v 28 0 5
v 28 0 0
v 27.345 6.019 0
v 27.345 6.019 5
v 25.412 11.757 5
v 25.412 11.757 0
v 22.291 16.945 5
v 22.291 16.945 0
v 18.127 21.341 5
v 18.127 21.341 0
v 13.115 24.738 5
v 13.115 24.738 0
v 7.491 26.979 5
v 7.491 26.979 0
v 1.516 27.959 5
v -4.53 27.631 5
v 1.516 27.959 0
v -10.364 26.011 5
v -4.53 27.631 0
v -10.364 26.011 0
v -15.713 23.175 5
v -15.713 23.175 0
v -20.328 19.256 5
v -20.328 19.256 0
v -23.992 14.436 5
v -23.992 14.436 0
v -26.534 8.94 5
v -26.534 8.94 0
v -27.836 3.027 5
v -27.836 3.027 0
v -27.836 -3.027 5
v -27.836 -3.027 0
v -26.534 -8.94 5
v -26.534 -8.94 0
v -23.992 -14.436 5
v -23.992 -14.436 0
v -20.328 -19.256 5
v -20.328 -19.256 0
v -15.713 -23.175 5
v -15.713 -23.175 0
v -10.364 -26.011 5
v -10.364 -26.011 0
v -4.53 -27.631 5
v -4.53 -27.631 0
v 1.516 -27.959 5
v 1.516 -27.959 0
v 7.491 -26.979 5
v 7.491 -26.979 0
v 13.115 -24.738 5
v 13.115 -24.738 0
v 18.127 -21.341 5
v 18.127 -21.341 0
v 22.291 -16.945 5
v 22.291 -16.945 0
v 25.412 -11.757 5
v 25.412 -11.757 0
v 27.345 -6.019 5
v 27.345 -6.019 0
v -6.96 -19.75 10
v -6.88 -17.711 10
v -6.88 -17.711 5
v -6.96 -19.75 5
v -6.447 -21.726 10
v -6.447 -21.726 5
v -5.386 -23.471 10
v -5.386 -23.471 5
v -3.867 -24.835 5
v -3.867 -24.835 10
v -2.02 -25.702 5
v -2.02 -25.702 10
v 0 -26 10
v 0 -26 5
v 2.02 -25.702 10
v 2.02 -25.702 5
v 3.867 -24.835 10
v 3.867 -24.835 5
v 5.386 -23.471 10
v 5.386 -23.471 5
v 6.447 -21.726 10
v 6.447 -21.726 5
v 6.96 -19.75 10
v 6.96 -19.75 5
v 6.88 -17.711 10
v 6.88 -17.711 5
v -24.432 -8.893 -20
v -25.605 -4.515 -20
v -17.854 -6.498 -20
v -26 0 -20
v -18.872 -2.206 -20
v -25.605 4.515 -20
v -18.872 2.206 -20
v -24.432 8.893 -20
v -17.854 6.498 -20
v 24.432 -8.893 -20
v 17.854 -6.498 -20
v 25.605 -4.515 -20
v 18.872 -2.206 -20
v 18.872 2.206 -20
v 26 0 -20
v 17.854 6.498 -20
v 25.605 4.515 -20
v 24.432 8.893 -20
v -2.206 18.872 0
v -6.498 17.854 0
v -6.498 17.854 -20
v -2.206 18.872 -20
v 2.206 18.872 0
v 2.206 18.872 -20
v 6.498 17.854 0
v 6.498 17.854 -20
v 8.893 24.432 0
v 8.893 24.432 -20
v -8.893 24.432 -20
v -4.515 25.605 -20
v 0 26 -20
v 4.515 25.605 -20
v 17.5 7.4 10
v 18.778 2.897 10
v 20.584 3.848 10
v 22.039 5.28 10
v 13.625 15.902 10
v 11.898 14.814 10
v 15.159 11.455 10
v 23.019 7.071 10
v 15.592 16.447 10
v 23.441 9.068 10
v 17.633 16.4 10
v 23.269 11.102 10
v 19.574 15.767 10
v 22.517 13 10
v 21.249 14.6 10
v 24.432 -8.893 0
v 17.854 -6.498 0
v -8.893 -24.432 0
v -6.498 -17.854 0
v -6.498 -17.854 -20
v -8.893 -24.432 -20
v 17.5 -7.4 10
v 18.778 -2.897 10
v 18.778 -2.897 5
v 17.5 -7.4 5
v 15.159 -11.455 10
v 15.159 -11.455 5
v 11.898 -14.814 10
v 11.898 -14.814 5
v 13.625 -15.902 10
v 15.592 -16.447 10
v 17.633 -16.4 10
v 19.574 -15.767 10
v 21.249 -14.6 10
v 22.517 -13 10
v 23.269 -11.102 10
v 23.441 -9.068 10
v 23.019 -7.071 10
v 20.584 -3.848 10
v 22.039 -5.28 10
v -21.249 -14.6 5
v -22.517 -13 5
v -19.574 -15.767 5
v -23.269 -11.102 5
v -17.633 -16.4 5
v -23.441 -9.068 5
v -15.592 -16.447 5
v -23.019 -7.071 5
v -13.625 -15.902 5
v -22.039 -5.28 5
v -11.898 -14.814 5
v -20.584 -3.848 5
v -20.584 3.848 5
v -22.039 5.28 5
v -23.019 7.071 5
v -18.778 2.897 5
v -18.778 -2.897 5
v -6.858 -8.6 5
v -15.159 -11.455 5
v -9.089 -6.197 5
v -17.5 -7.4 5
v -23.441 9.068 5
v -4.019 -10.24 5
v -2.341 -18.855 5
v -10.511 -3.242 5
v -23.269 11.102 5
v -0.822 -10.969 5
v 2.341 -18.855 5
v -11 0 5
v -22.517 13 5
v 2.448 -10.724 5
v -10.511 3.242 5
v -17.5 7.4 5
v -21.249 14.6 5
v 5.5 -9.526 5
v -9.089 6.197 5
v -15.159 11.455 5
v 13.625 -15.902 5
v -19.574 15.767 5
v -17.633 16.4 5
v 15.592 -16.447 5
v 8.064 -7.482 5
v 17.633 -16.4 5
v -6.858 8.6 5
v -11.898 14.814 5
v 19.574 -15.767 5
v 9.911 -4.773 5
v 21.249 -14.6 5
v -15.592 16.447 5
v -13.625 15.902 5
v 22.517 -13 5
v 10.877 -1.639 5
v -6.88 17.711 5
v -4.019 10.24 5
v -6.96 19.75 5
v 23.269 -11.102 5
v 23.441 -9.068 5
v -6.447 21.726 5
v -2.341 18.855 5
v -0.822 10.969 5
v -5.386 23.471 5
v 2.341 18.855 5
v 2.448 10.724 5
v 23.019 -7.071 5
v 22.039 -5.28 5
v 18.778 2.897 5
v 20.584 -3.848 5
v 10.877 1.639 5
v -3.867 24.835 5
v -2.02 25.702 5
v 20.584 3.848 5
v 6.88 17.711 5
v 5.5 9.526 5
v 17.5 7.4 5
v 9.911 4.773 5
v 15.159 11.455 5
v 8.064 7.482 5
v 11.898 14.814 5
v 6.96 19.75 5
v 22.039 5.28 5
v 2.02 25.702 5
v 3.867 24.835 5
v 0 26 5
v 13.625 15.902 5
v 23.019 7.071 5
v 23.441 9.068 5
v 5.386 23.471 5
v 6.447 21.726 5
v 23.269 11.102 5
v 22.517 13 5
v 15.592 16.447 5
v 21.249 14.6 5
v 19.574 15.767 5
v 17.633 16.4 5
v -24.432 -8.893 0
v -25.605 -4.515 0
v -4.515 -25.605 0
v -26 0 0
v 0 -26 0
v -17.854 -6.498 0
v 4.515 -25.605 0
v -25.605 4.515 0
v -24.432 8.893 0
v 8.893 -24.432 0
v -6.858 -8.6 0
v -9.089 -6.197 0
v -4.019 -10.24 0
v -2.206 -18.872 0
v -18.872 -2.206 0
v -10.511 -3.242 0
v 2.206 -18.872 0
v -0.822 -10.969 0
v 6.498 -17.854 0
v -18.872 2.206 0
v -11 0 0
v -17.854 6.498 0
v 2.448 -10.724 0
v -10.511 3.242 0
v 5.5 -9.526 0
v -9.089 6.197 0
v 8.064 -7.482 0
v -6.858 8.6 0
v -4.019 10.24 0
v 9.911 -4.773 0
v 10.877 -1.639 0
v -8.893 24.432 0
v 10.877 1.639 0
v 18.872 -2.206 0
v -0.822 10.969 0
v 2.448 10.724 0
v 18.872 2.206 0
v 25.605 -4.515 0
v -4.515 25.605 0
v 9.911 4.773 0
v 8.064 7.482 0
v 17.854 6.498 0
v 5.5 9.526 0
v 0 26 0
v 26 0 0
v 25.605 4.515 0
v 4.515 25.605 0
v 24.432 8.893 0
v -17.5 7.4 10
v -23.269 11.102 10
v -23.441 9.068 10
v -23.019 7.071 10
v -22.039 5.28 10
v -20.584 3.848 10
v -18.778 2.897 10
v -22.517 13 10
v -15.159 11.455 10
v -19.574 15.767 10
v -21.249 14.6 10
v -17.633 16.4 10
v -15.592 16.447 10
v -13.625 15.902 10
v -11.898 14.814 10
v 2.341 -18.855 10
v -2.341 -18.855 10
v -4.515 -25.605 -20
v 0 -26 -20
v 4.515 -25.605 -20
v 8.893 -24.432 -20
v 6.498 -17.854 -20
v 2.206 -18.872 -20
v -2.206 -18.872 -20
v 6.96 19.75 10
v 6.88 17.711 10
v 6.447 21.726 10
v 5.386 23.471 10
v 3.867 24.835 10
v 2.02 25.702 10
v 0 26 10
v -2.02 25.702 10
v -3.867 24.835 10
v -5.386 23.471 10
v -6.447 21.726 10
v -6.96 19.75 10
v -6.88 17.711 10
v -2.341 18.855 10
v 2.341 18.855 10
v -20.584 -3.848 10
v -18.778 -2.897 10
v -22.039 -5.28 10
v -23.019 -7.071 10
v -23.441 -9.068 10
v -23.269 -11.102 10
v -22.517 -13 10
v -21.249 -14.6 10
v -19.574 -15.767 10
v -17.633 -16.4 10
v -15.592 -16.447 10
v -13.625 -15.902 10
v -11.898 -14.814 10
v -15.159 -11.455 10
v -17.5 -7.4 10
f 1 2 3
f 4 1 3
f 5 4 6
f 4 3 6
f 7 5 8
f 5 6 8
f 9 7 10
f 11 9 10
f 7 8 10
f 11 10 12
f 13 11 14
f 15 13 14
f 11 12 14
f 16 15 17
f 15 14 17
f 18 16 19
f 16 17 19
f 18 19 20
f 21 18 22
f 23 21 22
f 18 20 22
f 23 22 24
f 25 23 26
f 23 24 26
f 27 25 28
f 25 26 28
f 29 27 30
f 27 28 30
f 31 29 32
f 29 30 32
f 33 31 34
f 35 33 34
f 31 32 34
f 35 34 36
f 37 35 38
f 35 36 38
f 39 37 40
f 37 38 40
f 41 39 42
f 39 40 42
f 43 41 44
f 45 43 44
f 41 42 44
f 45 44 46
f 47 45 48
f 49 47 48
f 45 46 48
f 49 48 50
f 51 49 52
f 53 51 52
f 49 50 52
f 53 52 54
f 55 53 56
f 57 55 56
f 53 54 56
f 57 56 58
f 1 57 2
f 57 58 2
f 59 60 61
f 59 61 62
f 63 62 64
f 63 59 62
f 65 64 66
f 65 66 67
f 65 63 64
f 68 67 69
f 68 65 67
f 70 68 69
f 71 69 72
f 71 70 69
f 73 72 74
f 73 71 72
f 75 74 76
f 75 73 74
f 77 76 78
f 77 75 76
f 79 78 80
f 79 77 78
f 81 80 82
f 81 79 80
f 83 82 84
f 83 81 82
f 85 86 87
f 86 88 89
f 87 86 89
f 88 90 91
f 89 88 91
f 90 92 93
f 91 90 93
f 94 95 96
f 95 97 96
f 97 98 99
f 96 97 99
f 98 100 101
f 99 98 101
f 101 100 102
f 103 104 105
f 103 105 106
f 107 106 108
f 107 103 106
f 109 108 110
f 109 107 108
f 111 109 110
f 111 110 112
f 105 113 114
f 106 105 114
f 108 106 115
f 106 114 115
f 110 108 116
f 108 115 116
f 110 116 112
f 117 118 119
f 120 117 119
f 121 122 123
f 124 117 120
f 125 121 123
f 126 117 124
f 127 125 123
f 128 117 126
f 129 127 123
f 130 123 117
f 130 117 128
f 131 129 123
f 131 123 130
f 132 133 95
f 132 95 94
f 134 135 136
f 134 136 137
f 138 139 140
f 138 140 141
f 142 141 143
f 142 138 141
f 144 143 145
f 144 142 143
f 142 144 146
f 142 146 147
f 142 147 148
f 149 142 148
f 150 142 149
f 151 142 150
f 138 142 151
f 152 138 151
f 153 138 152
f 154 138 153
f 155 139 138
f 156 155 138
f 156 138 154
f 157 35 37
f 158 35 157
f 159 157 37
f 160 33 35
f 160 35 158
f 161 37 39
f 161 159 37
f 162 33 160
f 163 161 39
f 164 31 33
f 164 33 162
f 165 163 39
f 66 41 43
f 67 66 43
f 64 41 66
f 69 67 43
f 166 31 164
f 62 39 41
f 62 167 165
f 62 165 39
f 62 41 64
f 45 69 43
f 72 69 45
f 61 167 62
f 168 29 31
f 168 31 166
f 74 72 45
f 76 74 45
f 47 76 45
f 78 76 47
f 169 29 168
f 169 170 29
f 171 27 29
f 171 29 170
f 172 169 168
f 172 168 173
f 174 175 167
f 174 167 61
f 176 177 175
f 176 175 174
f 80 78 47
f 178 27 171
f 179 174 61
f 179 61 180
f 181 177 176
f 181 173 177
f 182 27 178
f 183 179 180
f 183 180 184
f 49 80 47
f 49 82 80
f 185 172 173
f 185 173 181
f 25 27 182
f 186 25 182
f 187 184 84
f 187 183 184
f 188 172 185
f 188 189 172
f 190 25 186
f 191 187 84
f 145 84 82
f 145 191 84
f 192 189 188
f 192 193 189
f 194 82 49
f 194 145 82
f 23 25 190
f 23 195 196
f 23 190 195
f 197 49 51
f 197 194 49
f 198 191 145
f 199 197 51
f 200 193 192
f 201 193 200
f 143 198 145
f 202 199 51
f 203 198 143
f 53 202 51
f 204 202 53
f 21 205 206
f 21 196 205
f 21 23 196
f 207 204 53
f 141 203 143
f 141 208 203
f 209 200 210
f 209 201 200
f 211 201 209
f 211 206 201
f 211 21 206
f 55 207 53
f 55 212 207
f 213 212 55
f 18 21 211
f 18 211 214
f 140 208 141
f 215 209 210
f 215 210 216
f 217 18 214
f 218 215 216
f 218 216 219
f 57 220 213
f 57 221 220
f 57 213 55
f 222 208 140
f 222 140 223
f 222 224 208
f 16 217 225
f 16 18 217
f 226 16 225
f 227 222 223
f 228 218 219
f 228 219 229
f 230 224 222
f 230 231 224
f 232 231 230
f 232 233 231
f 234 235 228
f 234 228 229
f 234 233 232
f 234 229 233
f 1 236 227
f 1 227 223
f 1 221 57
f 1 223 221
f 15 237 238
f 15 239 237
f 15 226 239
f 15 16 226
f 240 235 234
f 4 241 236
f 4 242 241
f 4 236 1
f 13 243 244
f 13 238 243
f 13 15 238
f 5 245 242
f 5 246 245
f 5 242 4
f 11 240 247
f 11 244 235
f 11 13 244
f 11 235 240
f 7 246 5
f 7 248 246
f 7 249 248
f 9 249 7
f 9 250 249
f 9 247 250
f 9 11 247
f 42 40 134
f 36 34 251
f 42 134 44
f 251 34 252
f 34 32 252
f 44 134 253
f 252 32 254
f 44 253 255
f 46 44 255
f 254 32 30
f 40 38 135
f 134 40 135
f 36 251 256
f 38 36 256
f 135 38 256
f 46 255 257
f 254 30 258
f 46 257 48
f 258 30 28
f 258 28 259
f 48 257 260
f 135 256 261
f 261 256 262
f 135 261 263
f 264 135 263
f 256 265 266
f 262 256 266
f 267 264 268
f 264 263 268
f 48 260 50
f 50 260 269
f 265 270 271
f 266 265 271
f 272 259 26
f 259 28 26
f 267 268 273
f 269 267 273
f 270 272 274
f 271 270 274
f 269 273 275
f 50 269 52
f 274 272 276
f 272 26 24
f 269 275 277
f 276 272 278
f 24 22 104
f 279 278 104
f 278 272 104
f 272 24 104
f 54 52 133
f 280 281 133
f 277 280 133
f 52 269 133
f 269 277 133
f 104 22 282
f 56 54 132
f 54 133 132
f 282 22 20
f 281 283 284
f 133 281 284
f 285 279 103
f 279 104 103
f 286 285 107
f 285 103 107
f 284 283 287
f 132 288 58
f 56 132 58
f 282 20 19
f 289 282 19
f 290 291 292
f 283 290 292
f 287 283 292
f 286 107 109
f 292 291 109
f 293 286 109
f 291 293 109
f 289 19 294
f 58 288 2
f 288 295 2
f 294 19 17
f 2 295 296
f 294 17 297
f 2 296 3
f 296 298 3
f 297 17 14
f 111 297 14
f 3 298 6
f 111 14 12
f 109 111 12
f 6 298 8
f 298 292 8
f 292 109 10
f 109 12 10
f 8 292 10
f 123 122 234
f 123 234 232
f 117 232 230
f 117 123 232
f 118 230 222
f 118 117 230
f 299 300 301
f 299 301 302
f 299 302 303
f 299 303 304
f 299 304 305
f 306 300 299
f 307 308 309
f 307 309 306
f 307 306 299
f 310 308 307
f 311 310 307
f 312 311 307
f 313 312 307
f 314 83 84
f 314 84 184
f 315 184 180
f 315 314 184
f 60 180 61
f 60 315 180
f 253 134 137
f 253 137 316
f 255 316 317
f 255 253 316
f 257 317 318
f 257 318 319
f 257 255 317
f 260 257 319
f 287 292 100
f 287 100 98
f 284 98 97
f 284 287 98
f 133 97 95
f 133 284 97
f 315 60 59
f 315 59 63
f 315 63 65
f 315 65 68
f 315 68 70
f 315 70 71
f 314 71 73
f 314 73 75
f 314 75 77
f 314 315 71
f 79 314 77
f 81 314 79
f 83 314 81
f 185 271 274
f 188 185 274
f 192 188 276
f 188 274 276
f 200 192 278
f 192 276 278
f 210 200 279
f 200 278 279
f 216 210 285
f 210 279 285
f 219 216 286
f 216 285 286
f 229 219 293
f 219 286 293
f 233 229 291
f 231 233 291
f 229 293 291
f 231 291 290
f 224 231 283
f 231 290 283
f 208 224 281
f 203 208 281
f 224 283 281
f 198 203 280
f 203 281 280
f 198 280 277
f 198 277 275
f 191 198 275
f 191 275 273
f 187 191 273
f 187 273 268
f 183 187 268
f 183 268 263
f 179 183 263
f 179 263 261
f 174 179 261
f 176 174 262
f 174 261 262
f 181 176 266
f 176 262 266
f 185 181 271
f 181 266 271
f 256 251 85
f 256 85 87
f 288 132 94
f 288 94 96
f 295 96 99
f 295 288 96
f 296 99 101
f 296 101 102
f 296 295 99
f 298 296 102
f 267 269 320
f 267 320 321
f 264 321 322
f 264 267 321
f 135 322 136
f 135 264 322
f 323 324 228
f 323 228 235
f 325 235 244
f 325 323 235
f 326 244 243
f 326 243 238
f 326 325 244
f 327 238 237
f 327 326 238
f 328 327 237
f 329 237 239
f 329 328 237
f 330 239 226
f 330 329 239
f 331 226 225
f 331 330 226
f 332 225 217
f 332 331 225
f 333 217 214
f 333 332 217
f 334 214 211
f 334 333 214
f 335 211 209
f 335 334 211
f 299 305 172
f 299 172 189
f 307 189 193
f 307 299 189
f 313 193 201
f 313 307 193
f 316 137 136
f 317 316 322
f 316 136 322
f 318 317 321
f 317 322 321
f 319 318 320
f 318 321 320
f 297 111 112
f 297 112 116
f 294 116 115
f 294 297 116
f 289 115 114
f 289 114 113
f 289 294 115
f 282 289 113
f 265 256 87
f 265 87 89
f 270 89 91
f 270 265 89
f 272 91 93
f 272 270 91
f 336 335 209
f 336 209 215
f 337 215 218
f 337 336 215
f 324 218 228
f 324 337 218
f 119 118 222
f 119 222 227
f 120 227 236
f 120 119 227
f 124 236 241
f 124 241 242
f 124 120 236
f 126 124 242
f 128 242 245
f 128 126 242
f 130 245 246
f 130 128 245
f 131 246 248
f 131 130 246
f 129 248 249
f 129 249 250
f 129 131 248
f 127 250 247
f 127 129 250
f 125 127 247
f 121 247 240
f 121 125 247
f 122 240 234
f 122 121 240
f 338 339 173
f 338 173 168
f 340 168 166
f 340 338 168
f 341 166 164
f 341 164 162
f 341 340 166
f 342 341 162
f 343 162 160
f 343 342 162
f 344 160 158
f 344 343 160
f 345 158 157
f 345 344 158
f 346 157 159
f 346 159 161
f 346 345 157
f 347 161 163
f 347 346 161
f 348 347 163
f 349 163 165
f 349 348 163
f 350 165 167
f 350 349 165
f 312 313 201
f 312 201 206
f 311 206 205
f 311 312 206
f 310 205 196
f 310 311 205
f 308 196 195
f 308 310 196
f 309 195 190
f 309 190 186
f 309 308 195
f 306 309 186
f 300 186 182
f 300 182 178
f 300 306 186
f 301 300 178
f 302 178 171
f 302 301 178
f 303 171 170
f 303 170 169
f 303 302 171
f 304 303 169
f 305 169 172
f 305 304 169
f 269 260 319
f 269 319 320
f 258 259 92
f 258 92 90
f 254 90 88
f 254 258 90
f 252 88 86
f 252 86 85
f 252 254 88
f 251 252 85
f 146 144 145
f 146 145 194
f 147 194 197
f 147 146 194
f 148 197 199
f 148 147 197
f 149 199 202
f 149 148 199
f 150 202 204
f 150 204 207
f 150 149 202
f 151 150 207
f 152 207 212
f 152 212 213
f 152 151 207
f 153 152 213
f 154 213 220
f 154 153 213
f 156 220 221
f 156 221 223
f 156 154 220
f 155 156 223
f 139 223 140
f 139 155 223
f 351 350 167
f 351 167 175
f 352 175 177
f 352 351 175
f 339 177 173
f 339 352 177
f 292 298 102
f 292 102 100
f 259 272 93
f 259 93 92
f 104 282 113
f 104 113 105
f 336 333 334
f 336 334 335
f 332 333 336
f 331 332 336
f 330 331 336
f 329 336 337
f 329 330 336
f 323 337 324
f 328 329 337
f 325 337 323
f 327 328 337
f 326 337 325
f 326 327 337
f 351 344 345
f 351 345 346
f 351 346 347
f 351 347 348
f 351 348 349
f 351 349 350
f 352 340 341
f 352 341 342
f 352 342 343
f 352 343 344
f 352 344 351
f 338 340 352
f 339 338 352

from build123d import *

# Parameters (mm, degrees)
SKETCH_1_R          = 28
EXTRUDE_1_DEPTH     = 5
EXTRUDE_2_DEPTH     = 20
SKETCH_3_R          = 11
CUT_EXTRUDE_1_DEPTH = 5
EXTRUDE_START       = 5
EXTRUDE_4_DEPTH     = 5


with BuildPart() as part:
    # 草图1 → 凸台-拉伸1 (new body)
    with BuildSketch(Plane.XY):
        Circle(SKETCH_1_R)
    extrude(amount=EXTRUDE_1_DEPTH)

    # 草图2 → 凸台-拉伸2 (add)
    with BuildSketch(Plane(origin=(0, 0, 0), x_dir=(-1, 0, 0), z_dir=(0, 0, -1))):
        with BuildLine():
            Line((-6.498382723, 17.854159795), (-8.892523726, 24.43200814))
            ThreePointArc((-8.892523726, 24.43200814), (0, 26), (8.892523726, 24.43200814))
            Line((8.892523726, 24.43200814), (6.498382723, 17.854159795))
            ThreePointArc((6.498382723, 17.854159795), (0, 19), (-6.498382723, 17.854159795))
        make_face()
        with BuildLine():
            Line((17.854159795, 6.498382723), (24.43200814, 8.892523726))
            ThreePointArc((24.43200814, 8.892523726), (26, 0), (24.43200814, -8.892523726))
            Line((24.43200814, -8.892523726), (17.854159795, -6.498382723))
            ThreePointArc((17.854159795, -6.498382723), (19, 0), (17.854159795, 6.498382723))
        make_face()
        with BuildLine():
            Line((6.498382723, -17.854159795), (8.892523726, -24.43200814))
            ThreePointArc((8.892523726, -24.43200814), (0, -26), (-8.892523726, -24.43200814))
            Line((-8.892523726, -24.43200814), (-6.498382723, -17.854159795))
            ThreePointArc((-6.498382723, -17.854159795), (0, -19), (6.498382723, -17.854159795))
        make_face()
        with BuildLine():
            Line((-17.854159795, -6.498382723), (-24.43200814, -8.892523726))
            ThreePointArc((-24.43200814, -8.892523726), (-26, 0), (-24.43200814, 8.892523726))
            Line((-24.43200814, 8.892523726), (-17.854159795, 6.498382723))
            ThreePointArc((-17.854159795, 6.498382723), (-19, 0), (-17.854159795, -6.498382723))
        make_face()
    extrude(amount=EXTRUDE_2_DEPTH)

    # 草图3 → 切除-拉伸1 (cut)
    with BuildSketch(Plane(origin=(0, 0, 0), x_dir=(-1, 0, 0), z_dir=(0, 0, -1))):
        Circle(SKETCH_3_R)
    extrude(amount=-CUT_EXTRUDE_1_DEPTH, mode=Mode.SUBTRACT)

    # 草图4 → 凸台-拉伸4 (add)
    with BuildSketch(Plane.XY.offset(5).offset(EXTRUDE_START)):
        with BuildLine():
            ThreePointArc((6.880207673, 17.710526316), (0, 26), (-6.880207673, 17.710526316))
            ThreePointArc((-6.880207673, 17.710526316), (0, 19), (6.880207673, 17.710526316))
        make_face()
        with BuildLine():
            ThreePointArc((18.77786954, 2.89682853), (22.516660498, 13), (11.897661868, 14.813697786))
            ThreePointArc((11.897661868, 14.813697786), (16.454482672, 9.5), (18.77786954, 2.89682853))
        make_face()
        with BuildLine():
            ThreePointArc((11.897661868, -14.813697786), (22.516660498, -13), (18.77786954, -2.89682853))
            ThreePointArc((18.77786954, -2.89682853), (16.454482672, -9.5), (11.897661868, -14.813697786))
        make_face()
        with BuildLine():
            ThreePointArc((-6.880207673, -17.710526316), (0, -26), (6.880207673, -17.710526316))
            ThreePointArc((6.880207673, -17.710526316), (0, -19), (-6.880207673, -17.710526316))
        make_face()
        with BuildLine():
            ThreePointArc((-18.77786954, -2.89682853), (-22.516660498, -13), (-11.897661868, -14.813697786))
            ThreePointArc((-11.897661868, -14.813697786), (-16.454482672, -9.5), (-18.77786954, -2.89682853))
        make_face()
        with BuildLine():
            ThreePointArc((-11.897661868, 14.813697786), (-22.516660498, 13), (-18.77786954, 2.89682853))
            ThreePointArc((-18.77786954, 2.89682853), (-16.454482672, 9.5), (-11.897661868, 14.813697786))
        make_face()
    extrude(amount=-EXTRUDE_4_DEPTH)


solid = part.part
